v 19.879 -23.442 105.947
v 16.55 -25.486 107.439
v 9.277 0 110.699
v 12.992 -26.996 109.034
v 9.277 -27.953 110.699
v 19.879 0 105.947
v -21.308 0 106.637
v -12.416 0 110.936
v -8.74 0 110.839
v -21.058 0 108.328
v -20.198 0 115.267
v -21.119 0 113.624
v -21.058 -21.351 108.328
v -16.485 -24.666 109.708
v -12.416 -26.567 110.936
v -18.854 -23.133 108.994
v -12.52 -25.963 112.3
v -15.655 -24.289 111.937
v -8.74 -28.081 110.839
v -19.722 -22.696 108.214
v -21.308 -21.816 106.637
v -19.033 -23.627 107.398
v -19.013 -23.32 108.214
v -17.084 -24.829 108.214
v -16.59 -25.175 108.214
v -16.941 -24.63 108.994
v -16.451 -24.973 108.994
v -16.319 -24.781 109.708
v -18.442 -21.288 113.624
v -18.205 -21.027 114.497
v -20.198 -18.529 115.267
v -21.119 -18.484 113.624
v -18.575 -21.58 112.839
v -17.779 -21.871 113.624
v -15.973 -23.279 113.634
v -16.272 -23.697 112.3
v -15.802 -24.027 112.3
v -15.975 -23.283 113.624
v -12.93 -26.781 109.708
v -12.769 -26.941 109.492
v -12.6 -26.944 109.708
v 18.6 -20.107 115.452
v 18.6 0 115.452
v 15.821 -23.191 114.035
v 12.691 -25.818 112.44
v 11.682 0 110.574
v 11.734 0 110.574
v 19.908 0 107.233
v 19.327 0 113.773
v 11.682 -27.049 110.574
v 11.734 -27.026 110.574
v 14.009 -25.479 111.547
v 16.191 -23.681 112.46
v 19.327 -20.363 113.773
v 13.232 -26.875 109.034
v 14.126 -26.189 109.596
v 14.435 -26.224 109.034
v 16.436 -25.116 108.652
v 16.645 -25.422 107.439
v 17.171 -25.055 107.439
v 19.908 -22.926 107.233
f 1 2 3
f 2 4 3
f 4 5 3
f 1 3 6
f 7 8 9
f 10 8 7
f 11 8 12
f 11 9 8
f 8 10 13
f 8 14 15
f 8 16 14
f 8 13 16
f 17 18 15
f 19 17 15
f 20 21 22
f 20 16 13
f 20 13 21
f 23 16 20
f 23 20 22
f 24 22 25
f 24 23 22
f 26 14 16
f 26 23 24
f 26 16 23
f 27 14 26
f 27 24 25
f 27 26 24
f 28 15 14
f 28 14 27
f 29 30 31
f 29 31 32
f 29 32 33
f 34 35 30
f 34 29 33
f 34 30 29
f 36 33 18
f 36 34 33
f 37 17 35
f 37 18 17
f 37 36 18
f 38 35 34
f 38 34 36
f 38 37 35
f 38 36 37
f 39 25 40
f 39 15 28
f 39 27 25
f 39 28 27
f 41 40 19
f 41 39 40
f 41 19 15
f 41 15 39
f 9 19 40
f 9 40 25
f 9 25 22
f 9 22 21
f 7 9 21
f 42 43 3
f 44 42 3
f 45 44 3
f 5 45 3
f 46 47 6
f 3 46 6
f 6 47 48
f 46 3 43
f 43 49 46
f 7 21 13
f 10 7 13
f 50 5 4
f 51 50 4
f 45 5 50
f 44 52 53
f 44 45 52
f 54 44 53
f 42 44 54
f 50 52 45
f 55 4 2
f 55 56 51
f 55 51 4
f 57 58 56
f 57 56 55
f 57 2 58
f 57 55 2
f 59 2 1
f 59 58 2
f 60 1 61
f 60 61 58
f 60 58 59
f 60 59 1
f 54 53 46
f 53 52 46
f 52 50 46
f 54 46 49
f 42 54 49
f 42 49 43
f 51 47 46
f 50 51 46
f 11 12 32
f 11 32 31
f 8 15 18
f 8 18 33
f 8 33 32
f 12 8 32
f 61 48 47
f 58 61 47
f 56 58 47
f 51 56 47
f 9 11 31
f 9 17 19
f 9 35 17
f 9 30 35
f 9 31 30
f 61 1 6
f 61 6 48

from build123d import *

# Parameters (mm, degrees)
EXTRUDE_DEPTH = 100


with BuildPart() as extrude_body:
    # Sketch012 → Extrude (new body)
    with BuildSketch(Plane.XZ):
        Polygon((-20.197653, 115.267121), (-8.740475, 110.839136), (-21.307601, 106.637034), (-21.058408, 108.328475), (-12.41629, 110.93611), (-21.119285, 113.624325), align=None)
        Polygon((18.599507, 115.45201), (9.277163, 110.699436), (19.879051, 105.94687), (19.908392, 107.232778), (11.73356, 110.573557), (11.682224, 110.573557), (19.327358, 113.772605), align=None)
    extrude(amount=EXTRUDE_DEPTH)


with BuildPart() as common:
    # Sketch → Revolution (revolve)
    with BuildSketch(Plane.XZ):
        with BuildLine():
            Line((0, 0), (0, 135.563389))
            ThreePointArc((23.86226, 121.281178), (13.904936, 131.720055), (0, 135.563389))
            ThreePointArc((32.577943, 87.696618), (30.229669, 105.01041), (23.86226, 121.281178))
            ThreePointArc((22.101567, 52.101534), (30.047255, 69.102202), (32.577943, 87.696618))
            ThreePointArc((22.101567, 52.101534), (13.488015, 26.476163), (18.952965, 0))
            Line((0, 0), (18.952965, 0))
        make_face()
    revolve(axis=Axis((0, 0, 0), (0, 0, 1)))


with BuildPart() as common_1:
    # Clone placement: moved
    add(common.part.moved(Location((0, -1, 0))))

    # Common: intersect Extrude body
    add(extrude_body.part, mode=Mode.INTERSECT)


solid = common_1.part
